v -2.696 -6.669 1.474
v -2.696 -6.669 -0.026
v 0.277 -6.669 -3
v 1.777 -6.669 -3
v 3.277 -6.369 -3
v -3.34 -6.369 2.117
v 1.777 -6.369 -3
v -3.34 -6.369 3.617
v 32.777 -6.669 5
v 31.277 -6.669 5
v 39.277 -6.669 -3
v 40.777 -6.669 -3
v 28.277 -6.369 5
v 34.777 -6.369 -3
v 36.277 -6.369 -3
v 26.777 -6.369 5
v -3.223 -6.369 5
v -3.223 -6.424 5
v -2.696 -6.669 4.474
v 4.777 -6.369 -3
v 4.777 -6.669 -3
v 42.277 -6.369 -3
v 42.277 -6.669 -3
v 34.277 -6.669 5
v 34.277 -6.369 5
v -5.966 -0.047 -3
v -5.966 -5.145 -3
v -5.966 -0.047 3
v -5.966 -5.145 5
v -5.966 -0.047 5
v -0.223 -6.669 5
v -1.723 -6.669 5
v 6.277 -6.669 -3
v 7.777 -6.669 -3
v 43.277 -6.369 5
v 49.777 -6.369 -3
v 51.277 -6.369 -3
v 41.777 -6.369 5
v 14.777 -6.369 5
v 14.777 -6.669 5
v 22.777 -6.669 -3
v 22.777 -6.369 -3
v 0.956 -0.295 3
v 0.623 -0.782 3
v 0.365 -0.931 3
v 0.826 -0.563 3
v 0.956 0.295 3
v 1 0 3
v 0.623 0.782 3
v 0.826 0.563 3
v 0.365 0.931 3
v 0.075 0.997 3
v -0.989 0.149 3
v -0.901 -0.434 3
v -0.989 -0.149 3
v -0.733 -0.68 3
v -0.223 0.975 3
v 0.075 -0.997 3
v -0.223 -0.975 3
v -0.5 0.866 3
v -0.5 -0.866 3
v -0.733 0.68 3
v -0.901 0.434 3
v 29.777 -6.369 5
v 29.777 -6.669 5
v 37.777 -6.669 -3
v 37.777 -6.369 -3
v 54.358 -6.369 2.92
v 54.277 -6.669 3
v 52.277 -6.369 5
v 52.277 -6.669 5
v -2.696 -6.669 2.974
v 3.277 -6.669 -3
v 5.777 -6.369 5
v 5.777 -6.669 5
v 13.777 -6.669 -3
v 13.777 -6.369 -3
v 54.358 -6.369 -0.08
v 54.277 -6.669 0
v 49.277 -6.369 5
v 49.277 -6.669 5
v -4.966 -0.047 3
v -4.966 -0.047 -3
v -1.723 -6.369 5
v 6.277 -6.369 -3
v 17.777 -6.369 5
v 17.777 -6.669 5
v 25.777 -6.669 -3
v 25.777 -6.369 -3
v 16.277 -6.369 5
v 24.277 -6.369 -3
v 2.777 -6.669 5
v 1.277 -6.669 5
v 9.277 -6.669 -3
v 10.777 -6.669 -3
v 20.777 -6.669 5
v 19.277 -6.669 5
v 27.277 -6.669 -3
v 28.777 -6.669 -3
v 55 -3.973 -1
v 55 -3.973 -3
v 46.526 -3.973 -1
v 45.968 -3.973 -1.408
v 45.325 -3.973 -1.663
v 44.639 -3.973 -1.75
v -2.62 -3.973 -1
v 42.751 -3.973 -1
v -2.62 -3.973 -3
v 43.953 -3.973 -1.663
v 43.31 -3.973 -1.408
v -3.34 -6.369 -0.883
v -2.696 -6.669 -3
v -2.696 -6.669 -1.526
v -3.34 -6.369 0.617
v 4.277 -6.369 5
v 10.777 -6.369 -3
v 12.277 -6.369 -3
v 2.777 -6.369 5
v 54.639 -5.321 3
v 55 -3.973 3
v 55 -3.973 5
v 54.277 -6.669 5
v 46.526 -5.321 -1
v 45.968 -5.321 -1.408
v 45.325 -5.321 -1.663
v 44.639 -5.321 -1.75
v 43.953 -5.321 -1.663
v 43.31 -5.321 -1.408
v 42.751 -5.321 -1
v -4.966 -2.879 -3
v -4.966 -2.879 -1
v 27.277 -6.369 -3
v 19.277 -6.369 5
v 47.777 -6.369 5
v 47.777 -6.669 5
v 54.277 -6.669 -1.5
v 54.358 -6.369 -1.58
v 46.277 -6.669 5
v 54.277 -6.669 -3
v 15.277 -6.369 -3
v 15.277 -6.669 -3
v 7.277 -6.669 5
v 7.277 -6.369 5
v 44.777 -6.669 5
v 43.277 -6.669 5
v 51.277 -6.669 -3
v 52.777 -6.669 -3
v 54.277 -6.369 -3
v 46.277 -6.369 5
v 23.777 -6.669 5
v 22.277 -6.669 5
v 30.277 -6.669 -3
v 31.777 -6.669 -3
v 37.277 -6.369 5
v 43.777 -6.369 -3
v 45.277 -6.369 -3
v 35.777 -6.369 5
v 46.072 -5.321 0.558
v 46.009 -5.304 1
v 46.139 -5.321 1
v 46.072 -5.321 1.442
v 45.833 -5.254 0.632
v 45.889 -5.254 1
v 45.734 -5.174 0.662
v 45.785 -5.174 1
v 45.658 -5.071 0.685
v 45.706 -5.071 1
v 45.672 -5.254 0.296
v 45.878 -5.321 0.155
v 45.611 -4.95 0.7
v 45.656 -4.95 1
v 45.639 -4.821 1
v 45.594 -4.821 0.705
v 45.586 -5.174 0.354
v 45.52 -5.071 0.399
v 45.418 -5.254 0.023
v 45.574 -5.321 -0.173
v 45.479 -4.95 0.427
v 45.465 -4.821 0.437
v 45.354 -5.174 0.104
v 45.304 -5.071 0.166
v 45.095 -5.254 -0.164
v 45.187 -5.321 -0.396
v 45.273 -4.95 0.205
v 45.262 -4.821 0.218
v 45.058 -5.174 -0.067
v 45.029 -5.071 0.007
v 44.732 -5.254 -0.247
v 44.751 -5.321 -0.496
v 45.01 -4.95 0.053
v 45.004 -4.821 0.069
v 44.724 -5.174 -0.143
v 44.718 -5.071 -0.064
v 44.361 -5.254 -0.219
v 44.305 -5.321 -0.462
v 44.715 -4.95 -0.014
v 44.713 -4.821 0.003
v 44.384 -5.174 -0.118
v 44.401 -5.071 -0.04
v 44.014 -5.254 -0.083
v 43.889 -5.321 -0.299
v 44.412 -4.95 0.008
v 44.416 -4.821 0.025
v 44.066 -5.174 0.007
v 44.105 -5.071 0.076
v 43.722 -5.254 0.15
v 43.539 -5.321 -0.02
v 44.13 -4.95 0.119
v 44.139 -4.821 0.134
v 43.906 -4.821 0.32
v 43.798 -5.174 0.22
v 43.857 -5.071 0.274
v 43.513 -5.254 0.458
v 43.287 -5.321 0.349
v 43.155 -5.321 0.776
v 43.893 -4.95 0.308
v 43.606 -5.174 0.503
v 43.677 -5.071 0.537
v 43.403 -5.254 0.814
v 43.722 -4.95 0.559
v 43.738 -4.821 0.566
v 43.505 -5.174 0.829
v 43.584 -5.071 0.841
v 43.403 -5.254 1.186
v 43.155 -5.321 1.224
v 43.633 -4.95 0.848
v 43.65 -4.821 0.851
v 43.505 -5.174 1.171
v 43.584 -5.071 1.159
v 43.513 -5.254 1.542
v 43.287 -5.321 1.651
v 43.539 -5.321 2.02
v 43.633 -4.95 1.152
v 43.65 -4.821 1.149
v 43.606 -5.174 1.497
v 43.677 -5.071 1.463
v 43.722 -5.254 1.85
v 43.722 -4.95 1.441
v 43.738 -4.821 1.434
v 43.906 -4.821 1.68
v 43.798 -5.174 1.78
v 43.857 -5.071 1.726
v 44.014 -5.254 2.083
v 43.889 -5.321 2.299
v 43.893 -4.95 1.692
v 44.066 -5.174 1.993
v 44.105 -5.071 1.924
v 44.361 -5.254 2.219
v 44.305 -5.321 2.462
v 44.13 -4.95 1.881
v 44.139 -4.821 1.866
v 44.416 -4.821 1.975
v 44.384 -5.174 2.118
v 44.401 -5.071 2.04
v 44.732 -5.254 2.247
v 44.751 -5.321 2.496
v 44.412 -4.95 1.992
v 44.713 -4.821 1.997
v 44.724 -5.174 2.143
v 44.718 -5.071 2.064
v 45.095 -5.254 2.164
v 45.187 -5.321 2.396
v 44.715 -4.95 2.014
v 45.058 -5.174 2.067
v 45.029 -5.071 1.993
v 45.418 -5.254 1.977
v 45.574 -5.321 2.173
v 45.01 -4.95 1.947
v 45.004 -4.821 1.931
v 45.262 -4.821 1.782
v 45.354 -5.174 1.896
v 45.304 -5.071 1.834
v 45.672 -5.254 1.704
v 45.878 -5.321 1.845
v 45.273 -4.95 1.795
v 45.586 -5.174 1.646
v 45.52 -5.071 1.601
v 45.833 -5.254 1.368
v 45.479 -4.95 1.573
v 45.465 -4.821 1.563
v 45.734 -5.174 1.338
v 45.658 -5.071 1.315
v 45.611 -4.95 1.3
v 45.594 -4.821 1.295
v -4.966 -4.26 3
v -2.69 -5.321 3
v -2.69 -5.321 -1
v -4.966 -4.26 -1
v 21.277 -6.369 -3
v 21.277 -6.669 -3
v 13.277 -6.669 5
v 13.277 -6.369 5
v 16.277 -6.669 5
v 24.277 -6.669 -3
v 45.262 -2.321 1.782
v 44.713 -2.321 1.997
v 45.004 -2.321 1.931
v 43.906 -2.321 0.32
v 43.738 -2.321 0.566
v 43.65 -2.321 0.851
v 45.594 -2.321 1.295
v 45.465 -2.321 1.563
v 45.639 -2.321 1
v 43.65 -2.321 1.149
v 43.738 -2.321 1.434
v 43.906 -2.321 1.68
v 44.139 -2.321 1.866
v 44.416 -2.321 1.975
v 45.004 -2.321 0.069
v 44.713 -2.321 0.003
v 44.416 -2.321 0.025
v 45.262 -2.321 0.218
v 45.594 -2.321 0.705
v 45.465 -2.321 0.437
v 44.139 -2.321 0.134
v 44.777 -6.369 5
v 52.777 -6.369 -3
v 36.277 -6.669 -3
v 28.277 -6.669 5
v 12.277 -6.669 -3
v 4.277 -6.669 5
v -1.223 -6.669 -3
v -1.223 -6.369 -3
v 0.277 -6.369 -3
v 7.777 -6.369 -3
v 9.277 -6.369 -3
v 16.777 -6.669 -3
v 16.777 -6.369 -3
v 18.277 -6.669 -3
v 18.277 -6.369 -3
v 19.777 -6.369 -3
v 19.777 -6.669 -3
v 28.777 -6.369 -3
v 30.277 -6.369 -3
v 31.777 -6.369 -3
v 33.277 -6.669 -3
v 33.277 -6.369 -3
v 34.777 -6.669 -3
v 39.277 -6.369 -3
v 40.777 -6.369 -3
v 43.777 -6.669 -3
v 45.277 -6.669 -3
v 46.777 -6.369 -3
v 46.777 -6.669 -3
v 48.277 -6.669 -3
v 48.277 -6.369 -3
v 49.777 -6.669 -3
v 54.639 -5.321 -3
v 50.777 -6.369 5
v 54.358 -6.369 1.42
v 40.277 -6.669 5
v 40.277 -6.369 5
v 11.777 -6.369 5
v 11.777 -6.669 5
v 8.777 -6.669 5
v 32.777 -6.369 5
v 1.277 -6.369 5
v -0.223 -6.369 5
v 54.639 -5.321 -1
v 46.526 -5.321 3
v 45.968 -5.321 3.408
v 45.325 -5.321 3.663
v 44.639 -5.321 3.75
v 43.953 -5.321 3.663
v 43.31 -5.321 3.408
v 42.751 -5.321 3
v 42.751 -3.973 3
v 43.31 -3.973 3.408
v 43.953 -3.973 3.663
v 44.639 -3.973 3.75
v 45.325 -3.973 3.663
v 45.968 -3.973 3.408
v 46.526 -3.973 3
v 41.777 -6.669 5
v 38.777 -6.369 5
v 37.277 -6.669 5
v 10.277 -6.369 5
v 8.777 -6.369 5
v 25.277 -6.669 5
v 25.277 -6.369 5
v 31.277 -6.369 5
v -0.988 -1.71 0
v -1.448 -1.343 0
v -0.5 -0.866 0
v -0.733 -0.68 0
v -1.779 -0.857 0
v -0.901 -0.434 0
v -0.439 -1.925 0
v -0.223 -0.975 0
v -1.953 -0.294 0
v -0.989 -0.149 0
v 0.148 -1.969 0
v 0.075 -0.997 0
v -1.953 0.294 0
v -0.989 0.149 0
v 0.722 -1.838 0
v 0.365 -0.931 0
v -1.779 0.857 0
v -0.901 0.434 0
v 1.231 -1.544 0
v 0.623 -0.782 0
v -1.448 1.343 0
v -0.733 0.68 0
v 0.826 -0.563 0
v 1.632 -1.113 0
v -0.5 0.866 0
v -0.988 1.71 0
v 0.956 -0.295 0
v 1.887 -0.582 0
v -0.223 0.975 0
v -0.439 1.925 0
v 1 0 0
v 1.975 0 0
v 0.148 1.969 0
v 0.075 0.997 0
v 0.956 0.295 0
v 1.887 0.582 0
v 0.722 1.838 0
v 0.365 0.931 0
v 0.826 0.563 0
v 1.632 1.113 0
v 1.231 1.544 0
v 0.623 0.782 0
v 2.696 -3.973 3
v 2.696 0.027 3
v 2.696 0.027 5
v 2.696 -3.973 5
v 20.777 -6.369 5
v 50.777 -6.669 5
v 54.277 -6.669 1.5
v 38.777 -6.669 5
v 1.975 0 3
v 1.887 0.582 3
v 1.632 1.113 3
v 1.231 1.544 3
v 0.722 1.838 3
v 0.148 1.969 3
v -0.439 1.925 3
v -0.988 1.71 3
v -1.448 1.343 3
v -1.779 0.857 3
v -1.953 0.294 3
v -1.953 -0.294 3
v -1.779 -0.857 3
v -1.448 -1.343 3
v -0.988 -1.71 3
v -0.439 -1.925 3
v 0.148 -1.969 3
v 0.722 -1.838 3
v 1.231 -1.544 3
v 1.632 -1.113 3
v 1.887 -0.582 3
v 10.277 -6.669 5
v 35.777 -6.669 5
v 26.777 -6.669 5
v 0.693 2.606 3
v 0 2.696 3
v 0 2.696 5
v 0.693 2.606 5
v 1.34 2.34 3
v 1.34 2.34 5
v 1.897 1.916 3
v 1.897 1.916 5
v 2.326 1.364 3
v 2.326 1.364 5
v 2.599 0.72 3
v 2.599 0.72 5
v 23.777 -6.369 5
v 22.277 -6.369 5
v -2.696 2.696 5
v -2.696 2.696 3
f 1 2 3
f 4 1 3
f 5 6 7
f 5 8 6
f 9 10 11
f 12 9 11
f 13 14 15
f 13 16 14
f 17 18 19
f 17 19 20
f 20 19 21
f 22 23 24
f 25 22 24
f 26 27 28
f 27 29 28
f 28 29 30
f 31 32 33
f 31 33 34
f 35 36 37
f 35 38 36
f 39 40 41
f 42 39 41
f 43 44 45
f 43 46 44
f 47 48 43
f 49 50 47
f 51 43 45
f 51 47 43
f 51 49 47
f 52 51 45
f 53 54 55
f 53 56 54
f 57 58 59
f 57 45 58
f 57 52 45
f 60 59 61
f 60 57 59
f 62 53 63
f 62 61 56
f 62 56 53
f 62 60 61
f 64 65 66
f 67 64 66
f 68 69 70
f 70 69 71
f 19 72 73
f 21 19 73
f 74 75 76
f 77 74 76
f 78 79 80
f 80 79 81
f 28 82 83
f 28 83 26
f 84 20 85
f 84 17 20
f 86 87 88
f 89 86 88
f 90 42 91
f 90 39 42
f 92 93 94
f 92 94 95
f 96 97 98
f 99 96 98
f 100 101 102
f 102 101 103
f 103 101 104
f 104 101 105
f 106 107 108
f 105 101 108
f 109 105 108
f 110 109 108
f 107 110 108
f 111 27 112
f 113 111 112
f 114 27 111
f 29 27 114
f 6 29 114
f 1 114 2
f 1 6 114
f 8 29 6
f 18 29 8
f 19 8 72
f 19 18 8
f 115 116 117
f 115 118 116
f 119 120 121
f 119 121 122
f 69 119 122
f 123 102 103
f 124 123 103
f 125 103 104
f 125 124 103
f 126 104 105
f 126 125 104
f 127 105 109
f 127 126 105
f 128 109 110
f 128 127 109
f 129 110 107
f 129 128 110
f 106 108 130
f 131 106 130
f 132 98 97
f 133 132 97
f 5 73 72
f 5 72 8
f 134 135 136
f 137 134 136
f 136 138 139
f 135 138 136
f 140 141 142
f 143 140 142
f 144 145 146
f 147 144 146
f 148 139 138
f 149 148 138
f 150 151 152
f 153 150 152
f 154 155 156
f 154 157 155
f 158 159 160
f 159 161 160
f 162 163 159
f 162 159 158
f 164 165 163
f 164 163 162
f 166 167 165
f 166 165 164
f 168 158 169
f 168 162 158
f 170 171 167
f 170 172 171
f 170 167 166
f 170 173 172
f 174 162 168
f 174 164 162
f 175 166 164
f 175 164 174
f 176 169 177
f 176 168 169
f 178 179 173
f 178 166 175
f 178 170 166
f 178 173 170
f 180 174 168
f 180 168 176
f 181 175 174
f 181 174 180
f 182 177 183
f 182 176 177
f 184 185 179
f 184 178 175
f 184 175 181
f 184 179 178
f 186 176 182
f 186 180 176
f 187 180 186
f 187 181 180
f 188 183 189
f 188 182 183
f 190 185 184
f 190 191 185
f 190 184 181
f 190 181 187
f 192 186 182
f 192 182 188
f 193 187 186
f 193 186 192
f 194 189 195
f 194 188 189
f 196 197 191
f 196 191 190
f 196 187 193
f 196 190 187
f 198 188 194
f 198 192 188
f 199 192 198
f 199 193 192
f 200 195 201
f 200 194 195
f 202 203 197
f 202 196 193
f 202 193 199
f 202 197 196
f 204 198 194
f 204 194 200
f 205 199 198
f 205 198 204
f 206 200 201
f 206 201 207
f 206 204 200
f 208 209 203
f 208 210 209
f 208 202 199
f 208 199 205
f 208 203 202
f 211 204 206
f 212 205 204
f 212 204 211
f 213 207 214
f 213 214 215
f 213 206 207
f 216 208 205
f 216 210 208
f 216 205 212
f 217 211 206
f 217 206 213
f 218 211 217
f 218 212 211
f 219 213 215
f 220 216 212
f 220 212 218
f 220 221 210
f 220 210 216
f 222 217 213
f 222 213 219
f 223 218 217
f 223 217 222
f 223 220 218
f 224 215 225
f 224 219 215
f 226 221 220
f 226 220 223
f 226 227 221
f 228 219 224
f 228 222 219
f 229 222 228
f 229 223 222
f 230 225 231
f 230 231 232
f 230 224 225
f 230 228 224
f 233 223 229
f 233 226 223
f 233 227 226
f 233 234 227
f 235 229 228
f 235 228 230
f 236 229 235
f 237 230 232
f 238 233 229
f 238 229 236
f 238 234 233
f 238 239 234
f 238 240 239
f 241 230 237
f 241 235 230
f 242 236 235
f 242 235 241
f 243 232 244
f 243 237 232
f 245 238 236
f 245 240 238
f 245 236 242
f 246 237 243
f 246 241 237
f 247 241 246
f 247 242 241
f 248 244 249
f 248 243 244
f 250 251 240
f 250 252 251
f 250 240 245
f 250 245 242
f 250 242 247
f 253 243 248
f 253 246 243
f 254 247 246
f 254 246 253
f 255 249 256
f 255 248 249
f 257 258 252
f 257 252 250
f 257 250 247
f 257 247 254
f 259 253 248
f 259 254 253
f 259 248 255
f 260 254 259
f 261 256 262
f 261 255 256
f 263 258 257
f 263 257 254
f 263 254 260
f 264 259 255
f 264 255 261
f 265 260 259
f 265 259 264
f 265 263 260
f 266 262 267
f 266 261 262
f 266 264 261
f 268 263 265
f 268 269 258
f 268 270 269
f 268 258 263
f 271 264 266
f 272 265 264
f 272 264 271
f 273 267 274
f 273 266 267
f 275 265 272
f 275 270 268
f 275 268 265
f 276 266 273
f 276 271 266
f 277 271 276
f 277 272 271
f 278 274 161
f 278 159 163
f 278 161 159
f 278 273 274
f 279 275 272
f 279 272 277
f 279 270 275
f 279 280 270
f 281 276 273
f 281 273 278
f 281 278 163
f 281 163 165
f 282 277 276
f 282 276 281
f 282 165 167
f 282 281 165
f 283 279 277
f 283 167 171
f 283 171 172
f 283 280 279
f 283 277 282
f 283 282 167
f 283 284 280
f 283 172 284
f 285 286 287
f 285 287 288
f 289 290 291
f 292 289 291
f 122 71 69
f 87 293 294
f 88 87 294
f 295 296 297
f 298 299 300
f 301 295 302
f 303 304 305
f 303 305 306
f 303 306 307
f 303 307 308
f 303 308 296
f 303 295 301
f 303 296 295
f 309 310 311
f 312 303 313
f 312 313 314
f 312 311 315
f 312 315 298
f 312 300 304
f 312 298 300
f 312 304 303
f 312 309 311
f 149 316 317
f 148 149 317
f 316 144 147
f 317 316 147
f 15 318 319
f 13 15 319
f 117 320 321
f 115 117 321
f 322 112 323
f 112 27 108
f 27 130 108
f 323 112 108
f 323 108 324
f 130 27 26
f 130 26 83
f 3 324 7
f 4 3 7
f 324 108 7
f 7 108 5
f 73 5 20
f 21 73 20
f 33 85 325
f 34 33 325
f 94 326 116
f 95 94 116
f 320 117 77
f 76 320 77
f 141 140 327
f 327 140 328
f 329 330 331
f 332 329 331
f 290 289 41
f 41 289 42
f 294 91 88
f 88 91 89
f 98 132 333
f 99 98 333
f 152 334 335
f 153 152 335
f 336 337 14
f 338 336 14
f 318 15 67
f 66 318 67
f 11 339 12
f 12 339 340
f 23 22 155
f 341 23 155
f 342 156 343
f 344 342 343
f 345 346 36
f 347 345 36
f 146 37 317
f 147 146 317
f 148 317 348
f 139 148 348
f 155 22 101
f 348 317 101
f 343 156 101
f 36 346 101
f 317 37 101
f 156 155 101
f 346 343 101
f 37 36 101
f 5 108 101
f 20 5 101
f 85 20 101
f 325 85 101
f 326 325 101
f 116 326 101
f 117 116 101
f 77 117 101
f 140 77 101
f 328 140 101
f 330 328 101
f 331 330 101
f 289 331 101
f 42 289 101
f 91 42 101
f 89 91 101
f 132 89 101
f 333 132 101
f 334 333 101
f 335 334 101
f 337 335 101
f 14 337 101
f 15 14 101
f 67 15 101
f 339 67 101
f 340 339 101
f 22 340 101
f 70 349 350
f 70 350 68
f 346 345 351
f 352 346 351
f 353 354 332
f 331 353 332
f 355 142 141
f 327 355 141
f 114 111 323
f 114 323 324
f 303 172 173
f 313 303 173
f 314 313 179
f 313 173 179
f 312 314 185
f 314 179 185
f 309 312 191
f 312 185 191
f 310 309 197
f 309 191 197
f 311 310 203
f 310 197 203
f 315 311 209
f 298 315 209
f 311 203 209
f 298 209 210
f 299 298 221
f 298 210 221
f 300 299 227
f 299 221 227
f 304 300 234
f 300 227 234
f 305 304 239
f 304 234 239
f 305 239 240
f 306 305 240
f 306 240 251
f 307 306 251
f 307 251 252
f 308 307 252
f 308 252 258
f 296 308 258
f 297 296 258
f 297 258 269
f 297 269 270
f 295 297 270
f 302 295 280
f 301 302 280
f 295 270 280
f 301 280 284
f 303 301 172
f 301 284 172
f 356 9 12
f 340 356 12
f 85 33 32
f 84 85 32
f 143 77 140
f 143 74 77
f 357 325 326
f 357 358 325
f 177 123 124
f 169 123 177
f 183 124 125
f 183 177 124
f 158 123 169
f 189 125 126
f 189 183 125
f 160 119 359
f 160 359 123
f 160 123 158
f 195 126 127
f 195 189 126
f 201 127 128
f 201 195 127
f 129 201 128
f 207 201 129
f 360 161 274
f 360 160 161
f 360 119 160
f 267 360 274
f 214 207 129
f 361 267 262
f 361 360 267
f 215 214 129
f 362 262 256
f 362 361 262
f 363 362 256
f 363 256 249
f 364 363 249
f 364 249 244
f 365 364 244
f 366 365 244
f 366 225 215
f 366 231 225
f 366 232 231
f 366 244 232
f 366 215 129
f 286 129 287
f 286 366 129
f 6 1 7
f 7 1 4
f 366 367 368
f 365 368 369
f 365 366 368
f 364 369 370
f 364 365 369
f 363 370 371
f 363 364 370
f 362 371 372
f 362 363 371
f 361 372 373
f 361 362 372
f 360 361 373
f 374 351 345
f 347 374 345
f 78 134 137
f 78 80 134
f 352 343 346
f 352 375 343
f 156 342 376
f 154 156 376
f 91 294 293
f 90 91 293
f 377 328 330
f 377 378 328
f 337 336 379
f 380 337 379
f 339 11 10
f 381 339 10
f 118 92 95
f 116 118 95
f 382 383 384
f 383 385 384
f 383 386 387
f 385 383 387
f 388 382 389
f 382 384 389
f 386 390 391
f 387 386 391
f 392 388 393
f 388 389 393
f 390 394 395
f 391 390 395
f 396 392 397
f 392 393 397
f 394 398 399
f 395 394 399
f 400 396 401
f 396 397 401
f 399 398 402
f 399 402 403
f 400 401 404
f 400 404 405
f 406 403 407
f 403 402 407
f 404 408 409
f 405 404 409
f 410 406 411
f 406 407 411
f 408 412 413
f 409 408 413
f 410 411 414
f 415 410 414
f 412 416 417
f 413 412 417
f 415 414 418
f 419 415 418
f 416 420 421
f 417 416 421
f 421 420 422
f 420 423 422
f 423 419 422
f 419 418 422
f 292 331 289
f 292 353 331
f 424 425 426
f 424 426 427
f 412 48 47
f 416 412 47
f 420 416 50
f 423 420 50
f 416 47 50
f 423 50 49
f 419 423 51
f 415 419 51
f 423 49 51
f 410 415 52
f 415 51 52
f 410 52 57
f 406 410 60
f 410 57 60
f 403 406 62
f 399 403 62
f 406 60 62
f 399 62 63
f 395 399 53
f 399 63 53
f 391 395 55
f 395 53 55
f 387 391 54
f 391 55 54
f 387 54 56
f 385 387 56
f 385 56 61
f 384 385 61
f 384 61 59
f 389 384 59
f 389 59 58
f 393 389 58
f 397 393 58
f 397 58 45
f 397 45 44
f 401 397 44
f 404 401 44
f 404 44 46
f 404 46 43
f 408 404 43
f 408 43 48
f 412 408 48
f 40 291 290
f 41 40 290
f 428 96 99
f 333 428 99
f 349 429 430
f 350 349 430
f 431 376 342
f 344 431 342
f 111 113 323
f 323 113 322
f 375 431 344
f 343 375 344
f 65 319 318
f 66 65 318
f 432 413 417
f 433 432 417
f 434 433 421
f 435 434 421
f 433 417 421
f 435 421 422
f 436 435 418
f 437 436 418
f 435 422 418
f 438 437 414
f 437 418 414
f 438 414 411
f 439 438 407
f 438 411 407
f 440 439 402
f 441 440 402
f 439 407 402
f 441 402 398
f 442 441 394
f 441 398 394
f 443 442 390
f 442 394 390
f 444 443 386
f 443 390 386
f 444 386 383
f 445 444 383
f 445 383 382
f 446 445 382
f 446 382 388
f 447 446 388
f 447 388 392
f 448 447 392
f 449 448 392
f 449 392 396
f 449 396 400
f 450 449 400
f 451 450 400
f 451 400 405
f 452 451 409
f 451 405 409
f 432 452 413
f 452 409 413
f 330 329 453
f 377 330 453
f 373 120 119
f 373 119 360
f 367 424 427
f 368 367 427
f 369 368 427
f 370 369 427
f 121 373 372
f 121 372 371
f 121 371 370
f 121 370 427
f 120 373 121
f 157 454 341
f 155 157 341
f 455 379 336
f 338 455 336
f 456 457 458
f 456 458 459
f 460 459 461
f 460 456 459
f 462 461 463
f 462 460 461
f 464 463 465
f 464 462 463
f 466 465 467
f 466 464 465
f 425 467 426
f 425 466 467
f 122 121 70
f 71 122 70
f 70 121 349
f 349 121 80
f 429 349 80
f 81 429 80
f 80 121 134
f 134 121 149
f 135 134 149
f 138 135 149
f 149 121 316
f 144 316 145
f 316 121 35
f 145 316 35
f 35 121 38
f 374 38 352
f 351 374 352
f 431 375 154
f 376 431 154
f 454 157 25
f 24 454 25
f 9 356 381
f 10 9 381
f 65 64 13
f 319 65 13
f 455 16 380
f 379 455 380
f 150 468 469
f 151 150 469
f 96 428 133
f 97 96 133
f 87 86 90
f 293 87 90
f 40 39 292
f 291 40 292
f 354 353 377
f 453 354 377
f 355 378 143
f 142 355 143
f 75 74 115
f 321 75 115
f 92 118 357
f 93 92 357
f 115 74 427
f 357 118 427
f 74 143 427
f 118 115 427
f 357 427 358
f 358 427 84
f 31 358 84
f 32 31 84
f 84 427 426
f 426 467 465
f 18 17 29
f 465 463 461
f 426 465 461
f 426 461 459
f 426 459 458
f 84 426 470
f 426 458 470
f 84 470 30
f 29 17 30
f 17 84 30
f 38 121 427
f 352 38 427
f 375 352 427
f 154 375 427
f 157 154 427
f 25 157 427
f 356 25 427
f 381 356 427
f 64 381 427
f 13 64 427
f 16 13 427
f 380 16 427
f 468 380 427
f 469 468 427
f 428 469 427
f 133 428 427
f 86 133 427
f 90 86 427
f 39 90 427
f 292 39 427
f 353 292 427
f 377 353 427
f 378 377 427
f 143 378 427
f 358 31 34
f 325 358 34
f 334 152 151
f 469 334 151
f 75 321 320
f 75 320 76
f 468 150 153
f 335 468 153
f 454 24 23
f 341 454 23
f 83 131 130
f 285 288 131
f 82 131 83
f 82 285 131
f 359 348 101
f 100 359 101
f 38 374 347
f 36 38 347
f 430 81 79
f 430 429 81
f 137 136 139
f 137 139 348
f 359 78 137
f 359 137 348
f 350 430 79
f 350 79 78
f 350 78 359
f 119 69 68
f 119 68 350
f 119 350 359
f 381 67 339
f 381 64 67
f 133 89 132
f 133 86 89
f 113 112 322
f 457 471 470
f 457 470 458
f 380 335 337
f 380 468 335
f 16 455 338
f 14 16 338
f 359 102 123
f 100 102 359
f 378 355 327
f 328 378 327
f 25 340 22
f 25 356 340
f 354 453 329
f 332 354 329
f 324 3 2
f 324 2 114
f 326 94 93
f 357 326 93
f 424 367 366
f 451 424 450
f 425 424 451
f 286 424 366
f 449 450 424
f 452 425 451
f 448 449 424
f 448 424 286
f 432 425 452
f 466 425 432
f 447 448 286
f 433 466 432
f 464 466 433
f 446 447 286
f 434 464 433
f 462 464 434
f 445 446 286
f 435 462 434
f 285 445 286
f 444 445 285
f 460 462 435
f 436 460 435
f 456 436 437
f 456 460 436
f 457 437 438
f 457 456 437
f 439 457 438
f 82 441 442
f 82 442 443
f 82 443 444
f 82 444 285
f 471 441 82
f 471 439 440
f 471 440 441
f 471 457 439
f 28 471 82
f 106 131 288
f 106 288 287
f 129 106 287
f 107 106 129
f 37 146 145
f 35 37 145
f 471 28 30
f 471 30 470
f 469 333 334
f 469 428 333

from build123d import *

# Parameters (mm, degrees)
SKETCH1_R           = 1.975
BOSS_EXTRUDE1_DEPTH = 3
SKETCH2_R           = 1
CUT_EXTRUDE1_DEPTH  = 4
BOSS_EXTRUDE3_DEPTH = 2
SKETCH4_W           = 1
SKETCH4_H           = 5.097660252
BOSS_EXTRUDE5_DEPTH = 6
BOSS_EXTRUDE6_DEPTH = 6
BOSS_EXTRUDE7_DEPTH = 2
SKETCH8_R           = 1
BOSS_EXTRUDE8_DEPTH = 3
SKETCH9_R           = 2.75
SKETCH9_R_2         = 1
CUT_EXTRUDE2_DEPTH  = 3
FILLET1_R           = 0.5
CUT_EXTRUDE5_DEPTH  = 0.3


with BuildPart() as part:
    # Sketch1 → Boss-Extrude1 (new body)
    with BuildSketch(Plane.XY):
        Circle(SKETCH1_R)
    extrude(amount=BOSS_EXTRUDE1_DEPTH)

    # Sketch2 → Cut-Extrude1 (cut, through all)
    with BuildSketch(Plane.XY.offset(3)):
        Circle(SKETCH2_R)
    extrude(amount=-CUT_EXTRUDE1_DEPTH, mode=Mode.SUBTRACT)

    # Sketch3 → Boss-Extrude3 (add)
    with BuildSketch(Plane.XY.offset(3)):
        with BuildLine():
            Line((2.696329955, 0.027323162), (2.69646839, -3.972676835))
            Line((2.69646839, -3.972676835), (55, -3.972676835))
            Line((55, -3.972676835), (54.277483472, -6.669145226))
            Line((54.277483472, -6.669145226), (0, -6.669145226))
            Line((0, -6.669145226), (-2.69646839, -6.669145226))
            Line((-2.69646839, -6.669145226), (-5.965910349, -5.144579403))
            Line((-5.965910349, -5.144579403), (-5.965910349, -0.046919151))
            Line((-5.965910349, -0.046919151), (-2.69646839, 2.69646839))
            Line((-2.69646839, 2.69646839), (0, 2.69646839))
            ThreePointArc((0, 2.69646839), (1.897006291, 1.916326932), (2.696329955, 0.027323162))
        make_face()
    extrude(amount=BOSS_EXTRUDE3_DEPTH)

    # Sketch4 → Boss-Extrude5 (add)
    with BuildSketch(Plane(origin=(0, 0, 3), x_dir=(-1, 0, 0), z_dir=(0, 0, -1))):
        with Locations((5.465910349, -2.595749277)):
            Rectangle(SKETCH4_W, SKETCH4_H)
    extrude(amount=BOSS_EXTRUDE5_DEPTH)

    # Sketch5 → Boss-Extrude6 (add)
    with BuildSketch(Plane(origin=(0, 0, 3), x_dir=(-1, 0, 0), z_dir=(0, 0, -1))):
        Polygon((-54.638741736, -5.320911031), (2.690099823, -5.320911031), (4.965910349, -4.259683154), (4.965910349, -5.144579403), (5.965910349, -5.144579403), (2.69646839, -6.669145226), (-54.277483472, -6.669145226), align=None)
    extrude(amount=BOSS_EXTRUDE6_DEPTH)

    # Sketch6 → Boss-Extrude7 (add)
    with BuildSketch(Plane(origin=(0, 0, -3), x_dir=(-1, 0, 0), z_dir=(0, 0, -1))):
        Polygon((-54.638741736, -5.320911031), (-55, -3.972676835), (2.620283863, -3.972676835), (4.965910349, -2.878893242), (4.965910349, -4.259683154), (2.690099823, -5.320911031), align=None)
    extrude(amount=-BOSS_EXTRUDE7_DEPTH)

    # Sketch8 → Boss-Extrude8 (add)
    with BuildSketch(Plane(origin=(0, -5.320911031, 0), x_dir=(1, 0, 0), z_dir=(0, 1, 0))):
        with Locations((44.638741736, -1)):
            Circle(SKETCH8_R)
    extrude(amount=BOSS_EXTRUDE8_DEPTH)

    # Sketch9 → Cut-Extrude2 (cut)
    with BuildSketch(Plane(origin=(0, -5.320911031, 0), x_dir=(1, 0, 0), z_dir=(0, 1, 0))):
        with Locations((44.638741736, -1)):
            Circle(SKETCH9_R)
        with Locations((44.638741736, -1)):
            Circle(SKETCH9_R_2, mode=Mode.SUBTRACT)
    extrude(amount=CUT_EXTRUDE2_DEPTH, mode=Mode.SUBTRACT)

    # Fillet1
    fillet1_edges = [part.edges().sort_by_distance(p)[0] for p in [
        (43.638741736, -5.320911031, 1),
    ]]
    fillet(fillet1_edges, radius=FILLET1_R)

    # Sketch10 → Cut-Extrude5 (cut)
    with BuildSketch(Plane.XZ.offset(6.669145226)):
        Polygon((54.277483472, -3), (46.277483472, 5), (44.777483472, 5), (52.777483472, -3), align=None)
        Polygon((49.777483472, -3), (51.277483472, -3), (43.277483472, 5), (41.777483472, 5), align=None)
        Polygon((46.777483472, -3), (48.277483472, -3), (40.277483472, 5), (38.777483472, 5), align=None)
        Polygon((43.777483472, -3), (45.277483472, -3), (37.277483472, 5), (35.777483472, 5), align=None)
        Polygon((40.777483472, -3), (42.277483472, -3), (34.277483472, 5), (32.777483472, 5), align=None)
        Polygon((37.777483472, -3), (39.277483472, -3), (31.277483472, 5), (29.777483472, 5), align=None)
        Polygon((34.777483472, -3), (36.277483472, -3), (28.277483472, 5), (26.777483472, 5), align=None)
        Polygon((31.777483472, -3), (33.277483472, -3), (25.277483472, 5), (23.777483472, 5), align=None)
        Polygon((28.777483472, -3), (30.277483472, -3), (22.277483472, 5), (20.777483472, 5), align=None)
        Polygon((25.777483472, -3), (27.277483472, -3), (19.277483472, 5), (17.777483472, 5), align=None)
        Polygon((22.777483472, -3), (24.277483472, -3), (16.277483472, 5), (14.777483472, 5), align=None)
        Polygon((19.777483472, -3), (21.277483472, -3), (13.277483472, 5), (11.777483472, 5), align=None)
        Polygon((16.777483472, -3), (18.277483472, -3), (10.277483472, 5), (8.777483472, 5), align=None)
        Polygon((13.777483472, -3), (15.277483472, -3), (7.277483472, 5), (5.777483472, 5), align=None)
        Polygon((10.777483472, -3), (12.277483472, -3), (4.277483472, 5), (2.777483472, 5), align=None)
        Polygon((7.777483472, -3), (9.277483472, -3), (1.277483472, 5), (-0.222516528, 5), align=None)
        Polygon((4.777483472, -3), (6.277483472, -3), (-1.722516528, 5), (-3.222516528, 5), align=None)
        Polygon((1.777483472, -3), (3.277483472, -3), (-4.722516528, 5), (-6.222516528, 5), align=None)
        Polygon((-1.222516528, -3), (0.277483472, -3), (-7.722516528, 5), (-9.222516528, 5), align=None)
        Polygon((55.777483472, -3), (57.277483472, -3), (49.277483472, 5), (47.777483472, 5), align=None)
        Polygon((58.777483472, -3), (60.277483472, -3), (52.277483472, 5), (50.777483472, 5), align=None)
    extrude(amount=-CUT_EXTRUDE5_DEPTH, mode=Mode.SUBTRACT)


solid = part.part
